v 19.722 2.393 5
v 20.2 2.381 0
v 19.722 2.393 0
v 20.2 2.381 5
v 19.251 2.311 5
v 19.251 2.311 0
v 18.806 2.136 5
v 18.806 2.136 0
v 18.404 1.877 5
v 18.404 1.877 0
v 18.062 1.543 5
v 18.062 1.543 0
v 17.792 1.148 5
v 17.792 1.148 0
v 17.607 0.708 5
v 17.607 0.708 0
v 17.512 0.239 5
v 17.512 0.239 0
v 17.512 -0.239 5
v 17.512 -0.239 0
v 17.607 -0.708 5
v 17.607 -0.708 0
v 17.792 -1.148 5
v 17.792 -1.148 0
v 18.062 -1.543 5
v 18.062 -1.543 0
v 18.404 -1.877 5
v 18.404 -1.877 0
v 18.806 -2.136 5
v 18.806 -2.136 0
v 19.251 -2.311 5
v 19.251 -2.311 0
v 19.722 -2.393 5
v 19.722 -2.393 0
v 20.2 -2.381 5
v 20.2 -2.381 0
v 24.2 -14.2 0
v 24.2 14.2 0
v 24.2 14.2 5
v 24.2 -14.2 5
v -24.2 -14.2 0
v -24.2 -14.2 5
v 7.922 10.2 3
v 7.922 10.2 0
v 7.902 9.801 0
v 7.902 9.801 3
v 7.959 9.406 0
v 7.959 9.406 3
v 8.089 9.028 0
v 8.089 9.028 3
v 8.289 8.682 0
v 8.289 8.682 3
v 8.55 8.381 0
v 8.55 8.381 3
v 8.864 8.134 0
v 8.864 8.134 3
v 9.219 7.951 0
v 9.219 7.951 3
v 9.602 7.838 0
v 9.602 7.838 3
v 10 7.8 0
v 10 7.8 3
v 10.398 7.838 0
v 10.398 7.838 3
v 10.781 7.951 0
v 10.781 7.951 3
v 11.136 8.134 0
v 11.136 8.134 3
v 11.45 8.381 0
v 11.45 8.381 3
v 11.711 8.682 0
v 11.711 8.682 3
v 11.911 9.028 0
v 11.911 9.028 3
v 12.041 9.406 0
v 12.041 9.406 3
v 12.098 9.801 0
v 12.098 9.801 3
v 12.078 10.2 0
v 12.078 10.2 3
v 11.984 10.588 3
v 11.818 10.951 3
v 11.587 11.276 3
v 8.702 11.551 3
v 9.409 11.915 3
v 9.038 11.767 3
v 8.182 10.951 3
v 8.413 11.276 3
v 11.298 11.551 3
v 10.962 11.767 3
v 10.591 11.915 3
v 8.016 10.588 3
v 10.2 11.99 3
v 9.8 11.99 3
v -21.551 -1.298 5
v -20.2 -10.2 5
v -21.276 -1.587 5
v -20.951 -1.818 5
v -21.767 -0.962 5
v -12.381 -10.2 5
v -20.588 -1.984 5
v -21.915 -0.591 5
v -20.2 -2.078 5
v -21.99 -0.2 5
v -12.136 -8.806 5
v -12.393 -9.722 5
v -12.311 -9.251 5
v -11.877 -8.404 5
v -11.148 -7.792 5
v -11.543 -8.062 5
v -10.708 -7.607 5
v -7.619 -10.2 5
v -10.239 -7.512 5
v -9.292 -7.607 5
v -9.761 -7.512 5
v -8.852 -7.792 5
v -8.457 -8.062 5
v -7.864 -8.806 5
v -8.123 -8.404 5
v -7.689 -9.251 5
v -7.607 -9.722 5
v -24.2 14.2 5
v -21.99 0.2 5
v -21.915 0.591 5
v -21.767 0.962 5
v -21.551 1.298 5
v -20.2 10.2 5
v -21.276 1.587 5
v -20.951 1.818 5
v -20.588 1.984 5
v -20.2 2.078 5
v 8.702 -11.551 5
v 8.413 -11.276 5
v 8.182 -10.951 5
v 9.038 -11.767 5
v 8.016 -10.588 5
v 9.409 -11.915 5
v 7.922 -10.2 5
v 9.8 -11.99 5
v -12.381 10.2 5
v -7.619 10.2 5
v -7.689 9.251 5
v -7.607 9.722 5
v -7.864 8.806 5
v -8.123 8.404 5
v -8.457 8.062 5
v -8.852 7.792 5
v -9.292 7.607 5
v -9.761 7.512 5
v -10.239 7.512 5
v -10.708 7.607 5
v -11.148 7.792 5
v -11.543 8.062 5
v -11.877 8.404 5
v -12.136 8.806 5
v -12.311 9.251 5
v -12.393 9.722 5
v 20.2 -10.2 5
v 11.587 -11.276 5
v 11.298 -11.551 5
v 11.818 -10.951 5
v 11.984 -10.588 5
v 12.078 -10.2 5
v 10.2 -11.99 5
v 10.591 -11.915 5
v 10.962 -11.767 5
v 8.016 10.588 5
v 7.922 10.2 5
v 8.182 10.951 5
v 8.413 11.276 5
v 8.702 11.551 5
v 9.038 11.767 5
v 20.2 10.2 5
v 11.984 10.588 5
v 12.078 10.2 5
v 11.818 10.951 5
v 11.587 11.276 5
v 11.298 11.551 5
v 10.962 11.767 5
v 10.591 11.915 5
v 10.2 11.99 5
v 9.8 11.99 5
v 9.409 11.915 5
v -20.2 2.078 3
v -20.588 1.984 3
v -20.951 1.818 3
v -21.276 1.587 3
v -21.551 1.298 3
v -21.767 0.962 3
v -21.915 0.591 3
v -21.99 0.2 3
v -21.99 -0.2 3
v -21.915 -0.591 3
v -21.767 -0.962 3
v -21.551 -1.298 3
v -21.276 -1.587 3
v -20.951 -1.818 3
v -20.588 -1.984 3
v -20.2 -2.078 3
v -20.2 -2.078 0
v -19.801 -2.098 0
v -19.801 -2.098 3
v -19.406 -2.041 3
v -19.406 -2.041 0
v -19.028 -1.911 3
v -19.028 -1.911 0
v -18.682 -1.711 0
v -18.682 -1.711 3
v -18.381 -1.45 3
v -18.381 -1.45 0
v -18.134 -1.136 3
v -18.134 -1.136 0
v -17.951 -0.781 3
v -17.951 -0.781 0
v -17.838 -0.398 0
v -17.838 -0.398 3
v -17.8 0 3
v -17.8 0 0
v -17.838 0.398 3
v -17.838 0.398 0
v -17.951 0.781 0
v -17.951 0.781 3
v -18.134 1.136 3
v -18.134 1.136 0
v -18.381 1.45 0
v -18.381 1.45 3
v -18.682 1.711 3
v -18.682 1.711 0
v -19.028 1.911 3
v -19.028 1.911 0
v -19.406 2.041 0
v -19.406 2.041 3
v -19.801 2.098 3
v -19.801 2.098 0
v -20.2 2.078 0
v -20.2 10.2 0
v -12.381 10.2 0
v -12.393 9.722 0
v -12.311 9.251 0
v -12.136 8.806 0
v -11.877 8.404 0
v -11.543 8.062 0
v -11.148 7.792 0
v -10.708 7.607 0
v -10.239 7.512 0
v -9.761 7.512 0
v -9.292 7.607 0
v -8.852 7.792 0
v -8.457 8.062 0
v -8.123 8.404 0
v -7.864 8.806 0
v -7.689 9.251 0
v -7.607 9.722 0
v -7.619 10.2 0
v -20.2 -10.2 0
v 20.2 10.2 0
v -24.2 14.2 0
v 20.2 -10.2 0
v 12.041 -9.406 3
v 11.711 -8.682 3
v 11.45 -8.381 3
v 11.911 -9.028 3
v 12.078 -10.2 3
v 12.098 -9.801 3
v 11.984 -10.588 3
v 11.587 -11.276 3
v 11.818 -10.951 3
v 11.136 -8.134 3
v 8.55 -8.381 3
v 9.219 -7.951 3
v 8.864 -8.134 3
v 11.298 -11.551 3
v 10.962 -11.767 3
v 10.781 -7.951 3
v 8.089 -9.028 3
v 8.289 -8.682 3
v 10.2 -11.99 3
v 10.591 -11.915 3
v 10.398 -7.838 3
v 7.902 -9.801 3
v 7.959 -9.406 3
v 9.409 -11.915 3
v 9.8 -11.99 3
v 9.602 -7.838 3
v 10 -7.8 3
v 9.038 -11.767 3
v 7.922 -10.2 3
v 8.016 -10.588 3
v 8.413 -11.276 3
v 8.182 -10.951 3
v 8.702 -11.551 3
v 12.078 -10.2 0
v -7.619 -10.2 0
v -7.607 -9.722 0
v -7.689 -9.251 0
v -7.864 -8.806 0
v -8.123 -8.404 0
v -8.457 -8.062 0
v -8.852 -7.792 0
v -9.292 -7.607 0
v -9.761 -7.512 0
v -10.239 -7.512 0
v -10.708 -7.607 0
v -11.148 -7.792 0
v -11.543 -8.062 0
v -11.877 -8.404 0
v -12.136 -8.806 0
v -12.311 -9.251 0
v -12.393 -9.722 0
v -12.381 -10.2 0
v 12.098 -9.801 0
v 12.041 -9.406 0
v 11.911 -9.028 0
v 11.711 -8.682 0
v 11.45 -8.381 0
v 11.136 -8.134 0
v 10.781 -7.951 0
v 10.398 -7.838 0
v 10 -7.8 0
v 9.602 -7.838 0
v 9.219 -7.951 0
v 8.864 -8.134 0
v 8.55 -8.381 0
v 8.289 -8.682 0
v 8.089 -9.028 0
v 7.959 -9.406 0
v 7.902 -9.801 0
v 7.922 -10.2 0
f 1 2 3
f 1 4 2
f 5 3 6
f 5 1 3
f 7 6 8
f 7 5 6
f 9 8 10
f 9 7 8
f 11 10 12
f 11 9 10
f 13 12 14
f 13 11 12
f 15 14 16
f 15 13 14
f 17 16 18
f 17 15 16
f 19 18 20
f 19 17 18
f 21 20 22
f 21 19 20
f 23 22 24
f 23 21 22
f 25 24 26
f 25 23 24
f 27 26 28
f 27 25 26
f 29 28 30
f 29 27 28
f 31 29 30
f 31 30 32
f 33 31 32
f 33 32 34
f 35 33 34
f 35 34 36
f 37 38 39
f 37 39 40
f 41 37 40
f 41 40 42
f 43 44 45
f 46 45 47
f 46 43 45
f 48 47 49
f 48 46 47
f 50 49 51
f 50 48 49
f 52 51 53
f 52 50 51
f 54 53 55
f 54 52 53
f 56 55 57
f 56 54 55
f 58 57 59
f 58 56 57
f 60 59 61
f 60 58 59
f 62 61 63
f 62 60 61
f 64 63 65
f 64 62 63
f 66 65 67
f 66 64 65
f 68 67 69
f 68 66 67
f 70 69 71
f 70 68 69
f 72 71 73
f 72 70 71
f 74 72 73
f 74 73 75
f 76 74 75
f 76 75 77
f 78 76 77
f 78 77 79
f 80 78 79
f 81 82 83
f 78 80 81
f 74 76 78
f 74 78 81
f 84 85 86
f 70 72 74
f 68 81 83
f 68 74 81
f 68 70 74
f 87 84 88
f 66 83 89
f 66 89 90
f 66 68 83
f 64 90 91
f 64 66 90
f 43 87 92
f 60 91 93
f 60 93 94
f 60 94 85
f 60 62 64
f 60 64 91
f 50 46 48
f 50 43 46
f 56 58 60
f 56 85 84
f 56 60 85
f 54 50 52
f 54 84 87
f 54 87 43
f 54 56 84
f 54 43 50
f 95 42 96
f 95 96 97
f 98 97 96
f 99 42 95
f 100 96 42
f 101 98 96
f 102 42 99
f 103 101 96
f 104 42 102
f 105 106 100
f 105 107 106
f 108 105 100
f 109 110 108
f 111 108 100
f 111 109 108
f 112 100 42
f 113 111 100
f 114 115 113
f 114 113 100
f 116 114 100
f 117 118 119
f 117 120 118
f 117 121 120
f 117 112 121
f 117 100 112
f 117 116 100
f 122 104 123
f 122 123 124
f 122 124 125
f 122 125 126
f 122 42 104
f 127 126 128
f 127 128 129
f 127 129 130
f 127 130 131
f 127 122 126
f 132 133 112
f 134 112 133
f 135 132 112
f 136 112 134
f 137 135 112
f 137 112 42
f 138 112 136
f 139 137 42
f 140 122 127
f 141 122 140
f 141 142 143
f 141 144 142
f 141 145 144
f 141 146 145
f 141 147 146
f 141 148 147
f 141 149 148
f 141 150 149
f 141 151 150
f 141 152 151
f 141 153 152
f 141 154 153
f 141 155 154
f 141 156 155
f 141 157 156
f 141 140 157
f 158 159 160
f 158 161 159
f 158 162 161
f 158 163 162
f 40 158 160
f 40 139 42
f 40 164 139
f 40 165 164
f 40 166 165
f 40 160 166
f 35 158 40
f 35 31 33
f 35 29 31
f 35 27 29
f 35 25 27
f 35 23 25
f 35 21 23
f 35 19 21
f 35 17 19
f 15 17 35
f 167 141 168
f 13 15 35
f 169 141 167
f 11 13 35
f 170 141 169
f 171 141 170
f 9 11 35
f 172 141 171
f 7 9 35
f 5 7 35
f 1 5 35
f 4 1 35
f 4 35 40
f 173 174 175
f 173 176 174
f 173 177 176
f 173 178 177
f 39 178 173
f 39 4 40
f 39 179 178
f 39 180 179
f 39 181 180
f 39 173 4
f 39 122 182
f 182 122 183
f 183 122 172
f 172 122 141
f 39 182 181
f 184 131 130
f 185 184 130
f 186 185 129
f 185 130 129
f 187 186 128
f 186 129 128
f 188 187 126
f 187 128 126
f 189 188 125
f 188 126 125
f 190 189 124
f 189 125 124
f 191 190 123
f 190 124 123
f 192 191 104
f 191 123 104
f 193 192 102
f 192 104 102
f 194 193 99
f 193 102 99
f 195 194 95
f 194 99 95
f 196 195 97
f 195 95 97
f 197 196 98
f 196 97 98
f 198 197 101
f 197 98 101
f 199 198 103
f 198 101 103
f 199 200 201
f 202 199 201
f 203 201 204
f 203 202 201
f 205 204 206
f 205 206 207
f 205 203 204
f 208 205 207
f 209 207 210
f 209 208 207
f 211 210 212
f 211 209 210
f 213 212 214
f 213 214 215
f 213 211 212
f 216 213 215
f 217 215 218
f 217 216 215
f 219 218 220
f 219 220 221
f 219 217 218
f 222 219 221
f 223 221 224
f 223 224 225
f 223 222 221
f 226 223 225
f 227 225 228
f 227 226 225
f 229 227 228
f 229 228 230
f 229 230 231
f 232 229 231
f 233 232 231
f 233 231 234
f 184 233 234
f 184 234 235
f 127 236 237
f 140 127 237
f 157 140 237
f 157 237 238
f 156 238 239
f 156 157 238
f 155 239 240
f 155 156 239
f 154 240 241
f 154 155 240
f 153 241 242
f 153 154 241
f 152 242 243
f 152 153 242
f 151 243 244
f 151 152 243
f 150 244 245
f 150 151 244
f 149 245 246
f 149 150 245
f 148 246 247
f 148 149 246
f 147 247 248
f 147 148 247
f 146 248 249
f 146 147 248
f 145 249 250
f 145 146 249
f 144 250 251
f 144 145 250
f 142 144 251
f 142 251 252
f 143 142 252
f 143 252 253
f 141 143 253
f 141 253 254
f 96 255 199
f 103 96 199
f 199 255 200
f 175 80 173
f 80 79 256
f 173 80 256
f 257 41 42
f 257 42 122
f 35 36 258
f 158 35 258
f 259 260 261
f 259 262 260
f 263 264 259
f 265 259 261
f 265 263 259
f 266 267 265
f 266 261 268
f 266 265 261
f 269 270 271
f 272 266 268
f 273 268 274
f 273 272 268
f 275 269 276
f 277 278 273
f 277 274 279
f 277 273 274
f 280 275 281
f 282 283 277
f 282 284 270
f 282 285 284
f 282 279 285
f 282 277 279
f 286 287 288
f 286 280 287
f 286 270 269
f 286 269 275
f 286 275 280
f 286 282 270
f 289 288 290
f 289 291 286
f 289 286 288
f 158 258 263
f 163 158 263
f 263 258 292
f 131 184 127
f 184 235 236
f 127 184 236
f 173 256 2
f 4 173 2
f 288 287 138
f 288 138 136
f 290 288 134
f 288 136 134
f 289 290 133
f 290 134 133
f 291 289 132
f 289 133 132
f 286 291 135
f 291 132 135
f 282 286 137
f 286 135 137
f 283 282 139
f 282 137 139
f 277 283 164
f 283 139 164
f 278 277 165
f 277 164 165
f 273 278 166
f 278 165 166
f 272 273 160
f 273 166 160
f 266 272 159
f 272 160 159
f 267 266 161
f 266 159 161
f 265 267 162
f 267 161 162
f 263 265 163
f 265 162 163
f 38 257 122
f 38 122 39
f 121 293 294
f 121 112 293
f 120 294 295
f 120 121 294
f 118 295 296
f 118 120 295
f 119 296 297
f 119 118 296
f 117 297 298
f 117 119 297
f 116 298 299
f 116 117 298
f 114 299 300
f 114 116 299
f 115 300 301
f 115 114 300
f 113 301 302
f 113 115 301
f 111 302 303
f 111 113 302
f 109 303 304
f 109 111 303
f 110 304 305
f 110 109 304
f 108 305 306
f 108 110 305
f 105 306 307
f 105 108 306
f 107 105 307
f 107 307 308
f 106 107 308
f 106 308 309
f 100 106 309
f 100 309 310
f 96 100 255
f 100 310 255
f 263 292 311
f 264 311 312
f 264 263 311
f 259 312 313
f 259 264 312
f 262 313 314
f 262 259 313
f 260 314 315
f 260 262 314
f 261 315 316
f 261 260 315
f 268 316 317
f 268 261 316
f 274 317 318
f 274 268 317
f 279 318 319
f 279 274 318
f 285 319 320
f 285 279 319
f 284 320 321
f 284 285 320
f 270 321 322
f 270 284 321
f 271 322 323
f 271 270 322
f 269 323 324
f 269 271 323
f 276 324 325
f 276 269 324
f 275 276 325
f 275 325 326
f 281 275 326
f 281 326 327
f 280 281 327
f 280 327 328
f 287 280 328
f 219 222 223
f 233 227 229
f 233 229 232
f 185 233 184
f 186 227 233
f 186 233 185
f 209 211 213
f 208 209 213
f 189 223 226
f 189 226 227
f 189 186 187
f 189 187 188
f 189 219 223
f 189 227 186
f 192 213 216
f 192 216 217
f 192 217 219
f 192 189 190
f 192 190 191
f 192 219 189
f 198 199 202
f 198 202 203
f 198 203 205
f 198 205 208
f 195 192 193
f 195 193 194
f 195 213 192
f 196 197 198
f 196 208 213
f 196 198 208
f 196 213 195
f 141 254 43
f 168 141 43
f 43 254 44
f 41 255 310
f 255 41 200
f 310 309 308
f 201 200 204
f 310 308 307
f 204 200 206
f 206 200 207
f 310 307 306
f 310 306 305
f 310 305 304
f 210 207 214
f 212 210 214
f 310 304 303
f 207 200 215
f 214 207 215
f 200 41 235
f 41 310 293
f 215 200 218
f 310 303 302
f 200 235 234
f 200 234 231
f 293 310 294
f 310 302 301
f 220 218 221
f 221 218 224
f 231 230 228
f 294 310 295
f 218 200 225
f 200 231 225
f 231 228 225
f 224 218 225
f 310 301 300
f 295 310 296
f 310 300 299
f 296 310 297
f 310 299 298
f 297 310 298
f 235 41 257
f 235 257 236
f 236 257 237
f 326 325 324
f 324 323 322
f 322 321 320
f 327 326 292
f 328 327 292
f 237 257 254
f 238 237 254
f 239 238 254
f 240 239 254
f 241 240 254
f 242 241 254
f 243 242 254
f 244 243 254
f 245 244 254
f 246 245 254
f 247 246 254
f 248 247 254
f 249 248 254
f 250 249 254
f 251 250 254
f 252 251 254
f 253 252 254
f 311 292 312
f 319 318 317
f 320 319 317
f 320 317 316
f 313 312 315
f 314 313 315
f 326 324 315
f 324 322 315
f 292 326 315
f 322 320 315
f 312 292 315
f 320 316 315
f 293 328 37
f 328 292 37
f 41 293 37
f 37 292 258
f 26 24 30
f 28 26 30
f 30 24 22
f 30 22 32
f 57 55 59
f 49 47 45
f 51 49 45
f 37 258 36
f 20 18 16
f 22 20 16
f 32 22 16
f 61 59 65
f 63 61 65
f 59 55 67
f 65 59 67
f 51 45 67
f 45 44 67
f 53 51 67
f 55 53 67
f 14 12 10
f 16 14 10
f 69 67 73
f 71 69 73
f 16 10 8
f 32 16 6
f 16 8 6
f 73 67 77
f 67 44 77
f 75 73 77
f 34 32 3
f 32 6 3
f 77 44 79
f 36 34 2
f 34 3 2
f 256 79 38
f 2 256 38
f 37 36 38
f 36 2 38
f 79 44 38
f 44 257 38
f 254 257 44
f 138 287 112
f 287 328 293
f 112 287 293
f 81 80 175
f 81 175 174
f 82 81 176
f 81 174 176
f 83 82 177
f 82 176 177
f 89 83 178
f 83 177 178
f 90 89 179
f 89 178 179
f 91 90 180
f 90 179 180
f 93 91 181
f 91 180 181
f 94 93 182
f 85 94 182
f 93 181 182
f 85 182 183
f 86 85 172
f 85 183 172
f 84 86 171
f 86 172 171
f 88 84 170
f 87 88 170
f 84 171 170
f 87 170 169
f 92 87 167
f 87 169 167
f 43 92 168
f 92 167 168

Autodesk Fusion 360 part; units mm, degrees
sketch "Sketch1" plane through (0, 0, 0) normal (0, 0, 1) x (1, 0, 0)
  line L0 (24.2, -14.2) -> (-24.2, -14.2)
  line L1 (-24.2, -14.2) -> (-24.2, 14.2)
  line L2 (-24.2, 14.2) -> (24.2, 14.2)
  line L3 (24.2, 14.2) -> (24.2, -14.2)
  line L4 (24.2, -14.2) -> (-24.2, 14.2) construction
  line L5 (-24.2, -14.2) -> (24.2, 14.2) construction
  dimension "d1" = 48.4
  dimension "d2" = 28.4
extrude "Extrude1" add sketch "Sketch1" along normal blind 5
shell "Shell1" thickness 4 removed faces 2 at (-8.0667, -4.7333, 5) at (-8.0667, -4.7333, 0)
sketch "Sketch2" plane through (0, 0, 5) normal (0, 0, 1) x (-1, 0, 0)
  line L0 (-20.2, -10.2) -> (-20.2, 10.2)
  line L1 (-20.2, 10.2) -> (20.2, 10.2)
  line L2 (20.2, 10.2) -> (20.2, -10.2)
  line L3 (20.2, -10.2) -> (-20.2, -10.2)
  line L4 (-24.2, -14.2) -> (24.2, -14.2)
  line L5 (24.2, -14.2) -> (24.2, 14.2)
  line L6 (24.2, 14.2) -> (-24.2, 14.2)
  line L7 (-24.2, 14.2) -> (-24.2, -14.2)
  circle A0 centre (19.9, 0) radius 2.1
  circle A1 centre (10, -9.9) radius 2.4
  circle A2 centre (-10, -9.9) radius 2.1
  circle A3 centre (-19.9, 0) radius 2.4
  line L8 (-20.2, 0) -> (20.2, 0) construction
  line L9 (0, -10.2) -> (0, 10.2) construction
  circle A4 centre (-10, 9.9) radius 2.1
  circle A5 centre (10, 9.9) radius 2.4
  dimension "d6" = 4.2
  dimension "d7" = 0.3
  dimension "d8" = 4.8
  dimension "d9" = 0.3
  dimension "d11" = 4.2
  dimension "d12" = 0.3
  dimension "d14" = 4.8
  dimension "d15" = 0.3
  dimension "d16" = 10
  dimension "d17" = 10
  dimension "d18" = 4.2
  dimension "d19" = 0.3
  dimension "d20" = 10
  dimension "d21" = 4.8
  dimension "d22" = 10
  dimension "d23" = 0.3
extrude "Extrude2" add sketch "Sketch2" against normal blind 5 contours L0 A3 | L3 A1 | L1 A5 picked at (-19.3318, 0.2231) picked at (10.663, -9.6523) picked at (10.9063, 9.3029)
extrude "Extrude3" cut sketch "Sketch2" against normal blind 2 contours L3 A2 | L1 A4 | L2 A0 picked at (-9.6779, -10.88) picked at (-10.1971, 10.7717) picked at (20.7929, -0.0996)
extrude "Extrude4" add sketch "Sketch2" against normal blind 3 from surface at -2 contours L3 A2 | L1 A4 | L2 A0 picked at (-9.4862, -9.6246) picked at (-9.7428, 9.449) picked at (19.4174, -0.1552)
